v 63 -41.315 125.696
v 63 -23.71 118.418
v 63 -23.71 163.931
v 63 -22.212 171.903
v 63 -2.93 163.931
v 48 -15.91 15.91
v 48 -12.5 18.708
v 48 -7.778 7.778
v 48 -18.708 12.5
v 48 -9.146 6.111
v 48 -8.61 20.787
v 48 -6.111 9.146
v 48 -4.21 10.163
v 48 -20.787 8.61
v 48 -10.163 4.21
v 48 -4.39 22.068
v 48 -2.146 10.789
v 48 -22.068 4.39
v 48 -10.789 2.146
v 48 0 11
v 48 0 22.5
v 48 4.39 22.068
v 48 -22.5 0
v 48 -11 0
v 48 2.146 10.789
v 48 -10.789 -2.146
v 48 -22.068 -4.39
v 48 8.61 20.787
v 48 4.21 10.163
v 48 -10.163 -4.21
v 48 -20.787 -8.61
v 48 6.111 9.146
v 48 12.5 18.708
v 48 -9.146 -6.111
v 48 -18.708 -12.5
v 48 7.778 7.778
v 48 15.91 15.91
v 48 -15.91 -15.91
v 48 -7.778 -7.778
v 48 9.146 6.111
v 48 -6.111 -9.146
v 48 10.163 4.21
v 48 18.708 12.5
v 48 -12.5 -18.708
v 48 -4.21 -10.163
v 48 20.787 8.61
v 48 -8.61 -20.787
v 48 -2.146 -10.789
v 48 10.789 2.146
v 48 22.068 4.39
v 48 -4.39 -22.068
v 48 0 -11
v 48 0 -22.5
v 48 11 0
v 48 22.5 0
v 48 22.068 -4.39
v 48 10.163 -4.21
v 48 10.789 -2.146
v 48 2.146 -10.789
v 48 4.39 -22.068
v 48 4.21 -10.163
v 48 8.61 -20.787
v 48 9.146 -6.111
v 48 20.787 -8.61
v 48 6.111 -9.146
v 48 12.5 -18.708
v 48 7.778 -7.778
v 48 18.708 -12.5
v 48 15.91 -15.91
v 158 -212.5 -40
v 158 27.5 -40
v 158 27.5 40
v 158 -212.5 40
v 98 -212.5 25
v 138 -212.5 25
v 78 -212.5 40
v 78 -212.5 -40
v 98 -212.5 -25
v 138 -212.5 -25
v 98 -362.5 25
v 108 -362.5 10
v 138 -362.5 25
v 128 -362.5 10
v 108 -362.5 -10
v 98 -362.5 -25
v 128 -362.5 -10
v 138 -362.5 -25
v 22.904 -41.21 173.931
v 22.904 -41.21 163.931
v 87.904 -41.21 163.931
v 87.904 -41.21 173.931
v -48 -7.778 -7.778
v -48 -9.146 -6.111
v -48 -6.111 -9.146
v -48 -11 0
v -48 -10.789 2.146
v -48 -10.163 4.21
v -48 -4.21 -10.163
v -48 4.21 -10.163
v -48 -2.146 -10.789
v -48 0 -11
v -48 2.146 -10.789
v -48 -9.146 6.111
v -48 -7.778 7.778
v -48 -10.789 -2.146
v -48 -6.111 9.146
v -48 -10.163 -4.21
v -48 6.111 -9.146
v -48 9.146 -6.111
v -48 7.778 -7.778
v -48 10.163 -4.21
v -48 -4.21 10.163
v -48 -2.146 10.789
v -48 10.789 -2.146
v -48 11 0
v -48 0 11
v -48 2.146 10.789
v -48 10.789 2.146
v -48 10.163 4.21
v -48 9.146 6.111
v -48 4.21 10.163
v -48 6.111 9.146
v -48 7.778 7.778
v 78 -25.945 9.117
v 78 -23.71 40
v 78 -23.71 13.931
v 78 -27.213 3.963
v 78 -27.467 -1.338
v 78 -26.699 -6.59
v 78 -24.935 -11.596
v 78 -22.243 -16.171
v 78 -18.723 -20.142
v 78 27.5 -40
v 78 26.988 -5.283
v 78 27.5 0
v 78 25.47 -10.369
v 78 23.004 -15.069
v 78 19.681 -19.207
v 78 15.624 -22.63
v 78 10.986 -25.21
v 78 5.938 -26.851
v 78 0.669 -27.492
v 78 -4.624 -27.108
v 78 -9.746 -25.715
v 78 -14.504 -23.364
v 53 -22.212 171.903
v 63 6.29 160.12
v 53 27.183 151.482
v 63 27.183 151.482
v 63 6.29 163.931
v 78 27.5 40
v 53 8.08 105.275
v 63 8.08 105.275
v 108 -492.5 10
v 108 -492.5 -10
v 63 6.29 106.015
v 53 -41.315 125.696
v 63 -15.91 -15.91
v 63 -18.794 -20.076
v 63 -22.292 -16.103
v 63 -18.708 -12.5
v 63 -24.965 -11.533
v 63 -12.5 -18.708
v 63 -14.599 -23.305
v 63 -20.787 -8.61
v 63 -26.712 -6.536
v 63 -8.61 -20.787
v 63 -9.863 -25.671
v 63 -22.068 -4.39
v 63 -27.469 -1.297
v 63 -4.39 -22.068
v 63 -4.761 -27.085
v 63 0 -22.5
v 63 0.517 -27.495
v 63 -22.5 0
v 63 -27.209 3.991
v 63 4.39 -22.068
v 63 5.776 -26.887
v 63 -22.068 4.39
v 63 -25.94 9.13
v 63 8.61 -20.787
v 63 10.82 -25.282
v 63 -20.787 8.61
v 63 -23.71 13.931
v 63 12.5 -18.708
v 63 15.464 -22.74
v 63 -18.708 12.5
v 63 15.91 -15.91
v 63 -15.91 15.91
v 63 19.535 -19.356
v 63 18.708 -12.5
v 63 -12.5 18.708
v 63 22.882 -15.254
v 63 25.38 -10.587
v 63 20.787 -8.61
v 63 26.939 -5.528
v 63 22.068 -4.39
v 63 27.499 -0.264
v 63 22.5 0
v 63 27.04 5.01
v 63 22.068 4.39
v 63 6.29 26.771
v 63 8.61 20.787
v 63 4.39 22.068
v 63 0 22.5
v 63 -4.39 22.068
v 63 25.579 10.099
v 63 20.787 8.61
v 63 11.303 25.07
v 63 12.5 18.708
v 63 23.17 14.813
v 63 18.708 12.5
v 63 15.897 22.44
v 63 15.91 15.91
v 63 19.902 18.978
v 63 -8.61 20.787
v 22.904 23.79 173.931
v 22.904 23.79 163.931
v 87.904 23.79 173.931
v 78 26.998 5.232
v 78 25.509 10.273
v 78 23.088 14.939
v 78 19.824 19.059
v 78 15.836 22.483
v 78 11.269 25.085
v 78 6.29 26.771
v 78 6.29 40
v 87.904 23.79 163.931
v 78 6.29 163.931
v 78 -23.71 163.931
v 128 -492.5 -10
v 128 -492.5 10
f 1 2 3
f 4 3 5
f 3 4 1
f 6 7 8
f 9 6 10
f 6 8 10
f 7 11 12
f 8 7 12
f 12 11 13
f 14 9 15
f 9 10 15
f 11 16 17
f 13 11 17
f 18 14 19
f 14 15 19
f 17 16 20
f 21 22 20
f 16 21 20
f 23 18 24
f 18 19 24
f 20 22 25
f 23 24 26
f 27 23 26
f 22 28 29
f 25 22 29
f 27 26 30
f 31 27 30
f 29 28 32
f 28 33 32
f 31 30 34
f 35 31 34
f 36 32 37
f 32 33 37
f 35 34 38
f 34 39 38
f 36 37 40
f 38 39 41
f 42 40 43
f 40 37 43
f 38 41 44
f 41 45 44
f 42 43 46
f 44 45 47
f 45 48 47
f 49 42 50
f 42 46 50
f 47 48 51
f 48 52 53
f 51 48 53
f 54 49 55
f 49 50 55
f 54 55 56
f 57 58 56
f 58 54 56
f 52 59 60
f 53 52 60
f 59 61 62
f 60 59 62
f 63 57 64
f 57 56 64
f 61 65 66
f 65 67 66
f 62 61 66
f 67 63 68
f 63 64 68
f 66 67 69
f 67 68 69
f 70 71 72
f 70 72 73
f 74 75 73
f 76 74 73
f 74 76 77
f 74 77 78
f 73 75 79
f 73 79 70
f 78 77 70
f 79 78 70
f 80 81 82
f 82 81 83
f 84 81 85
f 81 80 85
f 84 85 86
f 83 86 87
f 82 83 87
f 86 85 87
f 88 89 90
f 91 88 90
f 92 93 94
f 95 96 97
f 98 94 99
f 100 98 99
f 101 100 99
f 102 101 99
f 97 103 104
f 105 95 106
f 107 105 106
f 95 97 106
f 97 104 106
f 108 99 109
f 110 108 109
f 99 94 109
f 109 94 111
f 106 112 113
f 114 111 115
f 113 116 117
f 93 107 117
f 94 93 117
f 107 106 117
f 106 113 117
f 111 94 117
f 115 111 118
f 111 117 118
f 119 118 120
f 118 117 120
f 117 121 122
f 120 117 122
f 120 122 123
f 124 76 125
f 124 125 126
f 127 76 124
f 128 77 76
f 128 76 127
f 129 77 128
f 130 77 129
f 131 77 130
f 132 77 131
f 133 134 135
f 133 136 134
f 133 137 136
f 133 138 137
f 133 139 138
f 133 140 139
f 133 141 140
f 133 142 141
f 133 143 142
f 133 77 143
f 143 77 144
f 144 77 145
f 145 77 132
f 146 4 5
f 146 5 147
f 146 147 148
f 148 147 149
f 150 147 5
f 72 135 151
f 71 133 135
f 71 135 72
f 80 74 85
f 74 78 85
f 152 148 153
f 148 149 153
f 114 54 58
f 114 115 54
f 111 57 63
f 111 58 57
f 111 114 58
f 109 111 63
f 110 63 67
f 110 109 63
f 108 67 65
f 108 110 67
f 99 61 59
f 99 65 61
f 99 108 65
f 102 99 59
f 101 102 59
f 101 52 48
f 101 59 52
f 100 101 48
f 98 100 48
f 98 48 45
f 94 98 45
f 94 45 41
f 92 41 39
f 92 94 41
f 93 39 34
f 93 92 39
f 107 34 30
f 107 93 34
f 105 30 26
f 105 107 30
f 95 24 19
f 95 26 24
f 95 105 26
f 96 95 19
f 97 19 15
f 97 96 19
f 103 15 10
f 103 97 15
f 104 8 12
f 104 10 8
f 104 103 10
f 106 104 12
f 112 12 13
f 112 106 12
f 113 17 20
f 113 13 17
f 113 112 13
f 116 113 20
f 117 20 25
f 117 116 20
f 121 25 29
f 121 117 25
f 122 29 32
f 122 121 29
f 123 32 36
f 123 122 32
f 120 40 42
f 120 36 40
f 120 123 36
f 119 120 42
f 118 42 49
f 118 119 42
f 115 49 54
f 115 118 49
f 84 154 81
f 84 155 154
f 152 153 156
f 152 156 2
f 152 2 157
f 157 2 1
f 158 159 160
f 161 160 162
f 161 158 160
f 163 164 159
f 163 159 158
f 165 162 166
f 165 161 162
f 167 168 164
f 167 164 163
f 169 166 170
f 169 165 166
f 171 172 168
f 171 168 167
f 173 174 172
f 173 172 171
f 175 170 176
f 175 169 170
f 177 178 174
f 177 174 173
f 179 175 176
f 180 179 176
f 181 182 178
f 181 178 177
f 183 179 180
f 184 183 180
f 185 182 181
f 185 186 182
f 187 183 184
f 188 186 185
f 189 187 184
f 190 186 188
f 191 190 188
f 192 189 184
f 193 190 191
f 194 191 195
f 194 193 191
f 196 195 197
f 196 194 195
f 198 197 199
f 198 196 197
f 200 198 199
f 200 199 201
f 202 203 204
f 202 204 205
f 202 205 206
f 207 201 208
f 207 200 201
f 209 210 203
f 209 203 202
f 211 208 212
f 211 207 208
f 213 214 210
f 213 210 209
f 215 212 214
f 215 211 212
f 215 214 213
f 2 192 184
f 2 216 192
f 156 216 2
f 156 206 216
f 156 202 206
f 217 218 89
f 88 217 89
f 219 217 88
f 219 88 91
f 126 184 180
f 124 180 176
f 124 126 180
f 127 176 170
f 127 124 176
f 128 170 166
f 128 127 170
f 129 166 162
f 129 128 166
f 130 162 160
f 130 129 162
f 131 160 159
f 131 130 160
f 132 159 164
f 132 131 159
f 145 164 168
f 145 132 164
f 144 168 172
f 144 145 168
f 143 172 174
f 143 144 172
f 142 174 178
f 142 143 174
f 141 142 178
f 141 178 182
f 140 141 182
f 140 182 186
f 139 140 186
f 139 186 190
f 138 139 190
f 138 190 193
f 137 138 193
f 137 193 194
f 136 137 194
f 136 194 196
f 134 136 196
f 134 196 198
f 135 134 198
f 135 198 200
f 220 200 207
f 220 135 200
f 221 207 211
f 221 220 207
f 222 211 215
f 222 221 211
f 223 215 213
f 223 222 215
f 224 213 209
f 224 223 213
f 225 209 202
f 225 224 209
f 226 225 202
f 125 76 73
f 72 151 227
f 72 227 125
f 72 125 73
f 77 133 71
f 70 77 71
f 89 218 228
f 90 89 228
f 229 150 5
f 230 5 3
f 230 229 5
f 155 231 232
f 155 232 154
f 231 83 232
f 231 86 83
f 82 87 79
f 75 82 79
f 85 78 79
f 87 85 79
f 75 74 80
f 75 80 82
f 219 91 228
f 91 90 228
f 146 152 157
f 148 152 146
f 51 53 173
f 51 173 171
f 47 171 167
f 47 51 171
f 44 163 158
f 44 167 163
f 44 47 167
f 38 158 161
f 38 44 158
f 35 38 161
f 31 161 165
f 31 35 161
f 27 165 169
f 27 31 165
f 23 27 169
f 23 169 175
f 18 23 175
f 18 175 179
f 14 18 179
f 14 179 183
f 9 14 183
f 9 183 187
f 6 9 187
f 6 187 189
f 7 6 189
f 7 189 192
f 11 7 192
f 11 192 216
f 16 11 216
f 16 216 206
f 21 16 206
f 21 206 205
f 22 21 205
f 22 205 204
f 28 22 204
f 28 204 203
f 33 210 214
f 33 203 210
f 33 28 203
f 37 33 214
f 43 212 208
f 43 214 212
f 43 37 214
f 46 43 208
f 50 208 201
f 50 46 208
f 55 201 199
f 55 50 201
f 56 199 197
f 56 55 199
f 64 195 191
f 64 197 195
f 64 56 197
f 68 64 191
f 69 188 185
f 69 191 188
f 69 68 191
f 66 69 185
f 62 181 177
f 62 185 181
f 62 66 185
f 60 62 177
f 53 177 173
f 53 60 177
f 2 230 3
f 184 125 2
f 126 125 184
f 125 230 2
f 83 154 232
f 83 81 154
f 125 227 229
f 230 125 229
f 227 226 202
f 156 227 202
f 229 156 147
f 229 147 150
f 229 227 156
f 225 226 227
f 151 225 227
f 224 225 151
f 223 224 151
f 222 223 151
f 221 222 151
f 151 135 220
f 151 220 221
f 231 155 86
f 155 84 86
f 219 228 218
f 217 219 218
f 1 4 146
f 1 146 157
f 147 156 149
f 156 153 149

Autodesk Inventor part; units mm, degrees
ref_plane "YZ Plane" through (0, 0, 0) normal (1, 0, 0) x (0, 1, 0)
ref_plane "XZ Plane" through (0, 0, 0) normal (0, 1, 0) x (-1, 0, 0)
ref_plane "XY Plane" through (0, 0, 0) normal (0, 0, 1) x (1, 0, 0)
sketch "Sketch1" plane through (0, 0, 0) normal (0, 0, 1) x (1, 0, 0)
  line L0 (-76.6085, 0) -> (76.6085, 0) construction
  line L1 (-48, 0) -> (48, 0)
  line L2 (48, 0) -> (48, 11)
  line L3 (48, 11) -> (-48, 11)
  line L4 (-48, 11) -> (-48, 0)
  point P0 (0, 0)
  point P1 (0, 0)
  point P2 (0, 11)
  dimension "d0" = 96
  dimension "d1" = 11
revolve "Revolution1" add sketch "Sketch1" angle 360 about axis through (-76.6085, 0, 0) along (1, 0, 0)
sketch "Sketch2" plane through (48, 0, 0) normal (1, 0, 0) x (0, 0, -1)
  circle A0 centre (0, 0) radius 22.5
  dimension "d3" = 45
extrude "Extrusion1" add sketch "Sketch2" along normal blind 30
sketch "Sketch3" plane through (0, 0, 0) normal (0, 0, 1) x (1, 0, 0)
  line L0 (78, -22.5) -> (78, 22.5) projected
  line L1 (78, 27.5) -> (78, -212.5)
  line L2 (48, 22.5) -> (78, 22.5) projected
  line L3 (48, -22.5) -> (78, -22.5) projected
  line L4 (78, 27.5) -> (158, 27.5)
  line L5 (158, 27.5) -> (158, -212.5)
  line L6 (78, -212.5) -> (98, -212.5)
  line L7 (158, -212.5) -> (138, -212.5)
  line L8 (118, 27.5) -> (118, -212.5) construction
  line L9 (98, -212.5) -> (98, -362.5)
  line L10 (98, -362.5) -> (138, -362.5)
  line L11 (138, -362.5) -> (138, -212.5)
  line L12 (108, -362.5) -> (128, -362.5)
  line L13 (128, -362.5) -> (128, -492.5)
  line L14 (128, -492.5) -> (108, -492.5)
  line L15 (108, -492.5) -> (108, -362.5)
  line L16 (138, -212.5) -> (98, -212.5)
  point P0 (0, 0)
  point P1 (118, -362.5)
  dimension "d6" = 5
  dimension "d7" = 190
  dimension "d8" = 80
  dimension "d9" = 40
  dimension "d10" = 150
  dimension "d36" = 20
  dimension "d37" = 130
extrude "Extrusion2" add sketch "Sketch3" along normal mid plane 80 contours L0 L1 L4 L5 L7 L16 L6
sketch "Sketch4" plane through (78, -212.5, 40) normal (-1, 0, 0) x (0, 0, 1)
  circle A0 centre (-40, 212.5) radius 22.5 projected
  circle A1 centre (-40, 212.5) radius 27.5
  line L0 (-13.229, 218.7899) -> (123.9314, 218.7899)
  line L1 (123.9314, 218.7899) -> (123.9314, 188.7899)
  line L2 (123.9314, 188.7899) -> (-26.0686, 188.7899)
  line L3 (0, 240) -> (0, 0) projected
  dimension "d13" = 55
  dimension "d14" = 150
  dimension "d15" = 90
  dimension "d16" = 30
  dimension "d17" = 90
extrude "Extrusion3" add sketch "Sketch4" along normal blind 15
extrude "Extrusion7" add sketch "Sketch3" along normal mid plane 50 contours L16 L11 L10 L9
extrude "Extrusion8" add sketch "Sketch3" along normal mid plane 20 contours L10 L13 L14 L15
sketch "Sketch5" plane through (63, -212.5, 40) normal (-1, 0, 0) x (0, 0, 1)
  line L0 (123.9314, 218.7899) -> (-13.229, 218.7899) projected
  circle A0 centre (-40, 212.5) radius 22.5 projected
  arc A1 (-13.229, 218.7899) -> (-26.0686, 188.7899) centre (-40, 212.5) ccw projected
  line L1 (-26.0686, 188.7899) -> (123.9314, 188.7899) projected
  line L2 (123.9314, 188.7899) -> (123.9314, 218.7899) projected
  line L3 (123.9314, 218.7899) -> (-13.229, 218.7899) projected
  line L4 (123.9314, 188.7899) -> (123.9314, 218.7899) projected
  line L5 (131.903, 190.2883) -> (111.482, 239.6833)
  line L6 (111.482, 239.6833) -> (65.2751, 220.5803)
  line L7 (65.2751, 220.5803) -> (85.6962, 171.1852)
  line L8 (131.903, 190.2883) -> (85.6962, 171.1852)
  point P0 (123.9314, 203.7899)
  dimension "d61" = 50
sketch "Sketch9" plane through (78, -23.7101, 163.9314) normal (0, 0, 1) x (1, 0, 0)
  line L0 (0, 0) -> (0, 30) projected
  line L1 (9.9045, 47.5) -> (-55.0955, 47.5)
  line L2 (-55.0955, 47.5) -> (-55.0955, -17.5)
  line L3 (-55.0955, -17.5) -> (9.9045, -17.5)
  line L4 (9.9045, -17.5) -> (9.9045, 47.5)
  line L5 (25, 47.5) -> (-40, -17.5) construction
  line L6 (-40, 47.5) -> (25, -17.5) construction
  point P0 (-78, 23.7101)
  dimension "d56" = 65
  dimension "d57" = 65
extrude "Extrusion10" add sketch "Sketch9" along normal blind 10 separate body
extrude "Extrusion11" add sketch "Sketch5" along normal blind 10 contours L5 L2 L1 L7 L0 | L0 L7 L6 L5 | L5 L8 L7 L1 L2 bodies 1
sketch "Sketch10" plane through (78, -23.7101, 173.9314) normal (0, 0, 1) x (1, 0, 0)
  line L0 (-55.0955, -17.5) -> (9.9045, -17.5) projected
  line L1 (9.9045, 47.5) -> (-55.0955, 47.5) projected
  line L2 (9.9045, -17.5) -> (-55.0955, 47.5) construction
  line L3 (9.9045, 47.5) -> (-55.0955, -17.5) construction
  point P0 (-78, 23.7101)
  point P1 (-22.5955, 15)
properties part number "simp_burnisher"
